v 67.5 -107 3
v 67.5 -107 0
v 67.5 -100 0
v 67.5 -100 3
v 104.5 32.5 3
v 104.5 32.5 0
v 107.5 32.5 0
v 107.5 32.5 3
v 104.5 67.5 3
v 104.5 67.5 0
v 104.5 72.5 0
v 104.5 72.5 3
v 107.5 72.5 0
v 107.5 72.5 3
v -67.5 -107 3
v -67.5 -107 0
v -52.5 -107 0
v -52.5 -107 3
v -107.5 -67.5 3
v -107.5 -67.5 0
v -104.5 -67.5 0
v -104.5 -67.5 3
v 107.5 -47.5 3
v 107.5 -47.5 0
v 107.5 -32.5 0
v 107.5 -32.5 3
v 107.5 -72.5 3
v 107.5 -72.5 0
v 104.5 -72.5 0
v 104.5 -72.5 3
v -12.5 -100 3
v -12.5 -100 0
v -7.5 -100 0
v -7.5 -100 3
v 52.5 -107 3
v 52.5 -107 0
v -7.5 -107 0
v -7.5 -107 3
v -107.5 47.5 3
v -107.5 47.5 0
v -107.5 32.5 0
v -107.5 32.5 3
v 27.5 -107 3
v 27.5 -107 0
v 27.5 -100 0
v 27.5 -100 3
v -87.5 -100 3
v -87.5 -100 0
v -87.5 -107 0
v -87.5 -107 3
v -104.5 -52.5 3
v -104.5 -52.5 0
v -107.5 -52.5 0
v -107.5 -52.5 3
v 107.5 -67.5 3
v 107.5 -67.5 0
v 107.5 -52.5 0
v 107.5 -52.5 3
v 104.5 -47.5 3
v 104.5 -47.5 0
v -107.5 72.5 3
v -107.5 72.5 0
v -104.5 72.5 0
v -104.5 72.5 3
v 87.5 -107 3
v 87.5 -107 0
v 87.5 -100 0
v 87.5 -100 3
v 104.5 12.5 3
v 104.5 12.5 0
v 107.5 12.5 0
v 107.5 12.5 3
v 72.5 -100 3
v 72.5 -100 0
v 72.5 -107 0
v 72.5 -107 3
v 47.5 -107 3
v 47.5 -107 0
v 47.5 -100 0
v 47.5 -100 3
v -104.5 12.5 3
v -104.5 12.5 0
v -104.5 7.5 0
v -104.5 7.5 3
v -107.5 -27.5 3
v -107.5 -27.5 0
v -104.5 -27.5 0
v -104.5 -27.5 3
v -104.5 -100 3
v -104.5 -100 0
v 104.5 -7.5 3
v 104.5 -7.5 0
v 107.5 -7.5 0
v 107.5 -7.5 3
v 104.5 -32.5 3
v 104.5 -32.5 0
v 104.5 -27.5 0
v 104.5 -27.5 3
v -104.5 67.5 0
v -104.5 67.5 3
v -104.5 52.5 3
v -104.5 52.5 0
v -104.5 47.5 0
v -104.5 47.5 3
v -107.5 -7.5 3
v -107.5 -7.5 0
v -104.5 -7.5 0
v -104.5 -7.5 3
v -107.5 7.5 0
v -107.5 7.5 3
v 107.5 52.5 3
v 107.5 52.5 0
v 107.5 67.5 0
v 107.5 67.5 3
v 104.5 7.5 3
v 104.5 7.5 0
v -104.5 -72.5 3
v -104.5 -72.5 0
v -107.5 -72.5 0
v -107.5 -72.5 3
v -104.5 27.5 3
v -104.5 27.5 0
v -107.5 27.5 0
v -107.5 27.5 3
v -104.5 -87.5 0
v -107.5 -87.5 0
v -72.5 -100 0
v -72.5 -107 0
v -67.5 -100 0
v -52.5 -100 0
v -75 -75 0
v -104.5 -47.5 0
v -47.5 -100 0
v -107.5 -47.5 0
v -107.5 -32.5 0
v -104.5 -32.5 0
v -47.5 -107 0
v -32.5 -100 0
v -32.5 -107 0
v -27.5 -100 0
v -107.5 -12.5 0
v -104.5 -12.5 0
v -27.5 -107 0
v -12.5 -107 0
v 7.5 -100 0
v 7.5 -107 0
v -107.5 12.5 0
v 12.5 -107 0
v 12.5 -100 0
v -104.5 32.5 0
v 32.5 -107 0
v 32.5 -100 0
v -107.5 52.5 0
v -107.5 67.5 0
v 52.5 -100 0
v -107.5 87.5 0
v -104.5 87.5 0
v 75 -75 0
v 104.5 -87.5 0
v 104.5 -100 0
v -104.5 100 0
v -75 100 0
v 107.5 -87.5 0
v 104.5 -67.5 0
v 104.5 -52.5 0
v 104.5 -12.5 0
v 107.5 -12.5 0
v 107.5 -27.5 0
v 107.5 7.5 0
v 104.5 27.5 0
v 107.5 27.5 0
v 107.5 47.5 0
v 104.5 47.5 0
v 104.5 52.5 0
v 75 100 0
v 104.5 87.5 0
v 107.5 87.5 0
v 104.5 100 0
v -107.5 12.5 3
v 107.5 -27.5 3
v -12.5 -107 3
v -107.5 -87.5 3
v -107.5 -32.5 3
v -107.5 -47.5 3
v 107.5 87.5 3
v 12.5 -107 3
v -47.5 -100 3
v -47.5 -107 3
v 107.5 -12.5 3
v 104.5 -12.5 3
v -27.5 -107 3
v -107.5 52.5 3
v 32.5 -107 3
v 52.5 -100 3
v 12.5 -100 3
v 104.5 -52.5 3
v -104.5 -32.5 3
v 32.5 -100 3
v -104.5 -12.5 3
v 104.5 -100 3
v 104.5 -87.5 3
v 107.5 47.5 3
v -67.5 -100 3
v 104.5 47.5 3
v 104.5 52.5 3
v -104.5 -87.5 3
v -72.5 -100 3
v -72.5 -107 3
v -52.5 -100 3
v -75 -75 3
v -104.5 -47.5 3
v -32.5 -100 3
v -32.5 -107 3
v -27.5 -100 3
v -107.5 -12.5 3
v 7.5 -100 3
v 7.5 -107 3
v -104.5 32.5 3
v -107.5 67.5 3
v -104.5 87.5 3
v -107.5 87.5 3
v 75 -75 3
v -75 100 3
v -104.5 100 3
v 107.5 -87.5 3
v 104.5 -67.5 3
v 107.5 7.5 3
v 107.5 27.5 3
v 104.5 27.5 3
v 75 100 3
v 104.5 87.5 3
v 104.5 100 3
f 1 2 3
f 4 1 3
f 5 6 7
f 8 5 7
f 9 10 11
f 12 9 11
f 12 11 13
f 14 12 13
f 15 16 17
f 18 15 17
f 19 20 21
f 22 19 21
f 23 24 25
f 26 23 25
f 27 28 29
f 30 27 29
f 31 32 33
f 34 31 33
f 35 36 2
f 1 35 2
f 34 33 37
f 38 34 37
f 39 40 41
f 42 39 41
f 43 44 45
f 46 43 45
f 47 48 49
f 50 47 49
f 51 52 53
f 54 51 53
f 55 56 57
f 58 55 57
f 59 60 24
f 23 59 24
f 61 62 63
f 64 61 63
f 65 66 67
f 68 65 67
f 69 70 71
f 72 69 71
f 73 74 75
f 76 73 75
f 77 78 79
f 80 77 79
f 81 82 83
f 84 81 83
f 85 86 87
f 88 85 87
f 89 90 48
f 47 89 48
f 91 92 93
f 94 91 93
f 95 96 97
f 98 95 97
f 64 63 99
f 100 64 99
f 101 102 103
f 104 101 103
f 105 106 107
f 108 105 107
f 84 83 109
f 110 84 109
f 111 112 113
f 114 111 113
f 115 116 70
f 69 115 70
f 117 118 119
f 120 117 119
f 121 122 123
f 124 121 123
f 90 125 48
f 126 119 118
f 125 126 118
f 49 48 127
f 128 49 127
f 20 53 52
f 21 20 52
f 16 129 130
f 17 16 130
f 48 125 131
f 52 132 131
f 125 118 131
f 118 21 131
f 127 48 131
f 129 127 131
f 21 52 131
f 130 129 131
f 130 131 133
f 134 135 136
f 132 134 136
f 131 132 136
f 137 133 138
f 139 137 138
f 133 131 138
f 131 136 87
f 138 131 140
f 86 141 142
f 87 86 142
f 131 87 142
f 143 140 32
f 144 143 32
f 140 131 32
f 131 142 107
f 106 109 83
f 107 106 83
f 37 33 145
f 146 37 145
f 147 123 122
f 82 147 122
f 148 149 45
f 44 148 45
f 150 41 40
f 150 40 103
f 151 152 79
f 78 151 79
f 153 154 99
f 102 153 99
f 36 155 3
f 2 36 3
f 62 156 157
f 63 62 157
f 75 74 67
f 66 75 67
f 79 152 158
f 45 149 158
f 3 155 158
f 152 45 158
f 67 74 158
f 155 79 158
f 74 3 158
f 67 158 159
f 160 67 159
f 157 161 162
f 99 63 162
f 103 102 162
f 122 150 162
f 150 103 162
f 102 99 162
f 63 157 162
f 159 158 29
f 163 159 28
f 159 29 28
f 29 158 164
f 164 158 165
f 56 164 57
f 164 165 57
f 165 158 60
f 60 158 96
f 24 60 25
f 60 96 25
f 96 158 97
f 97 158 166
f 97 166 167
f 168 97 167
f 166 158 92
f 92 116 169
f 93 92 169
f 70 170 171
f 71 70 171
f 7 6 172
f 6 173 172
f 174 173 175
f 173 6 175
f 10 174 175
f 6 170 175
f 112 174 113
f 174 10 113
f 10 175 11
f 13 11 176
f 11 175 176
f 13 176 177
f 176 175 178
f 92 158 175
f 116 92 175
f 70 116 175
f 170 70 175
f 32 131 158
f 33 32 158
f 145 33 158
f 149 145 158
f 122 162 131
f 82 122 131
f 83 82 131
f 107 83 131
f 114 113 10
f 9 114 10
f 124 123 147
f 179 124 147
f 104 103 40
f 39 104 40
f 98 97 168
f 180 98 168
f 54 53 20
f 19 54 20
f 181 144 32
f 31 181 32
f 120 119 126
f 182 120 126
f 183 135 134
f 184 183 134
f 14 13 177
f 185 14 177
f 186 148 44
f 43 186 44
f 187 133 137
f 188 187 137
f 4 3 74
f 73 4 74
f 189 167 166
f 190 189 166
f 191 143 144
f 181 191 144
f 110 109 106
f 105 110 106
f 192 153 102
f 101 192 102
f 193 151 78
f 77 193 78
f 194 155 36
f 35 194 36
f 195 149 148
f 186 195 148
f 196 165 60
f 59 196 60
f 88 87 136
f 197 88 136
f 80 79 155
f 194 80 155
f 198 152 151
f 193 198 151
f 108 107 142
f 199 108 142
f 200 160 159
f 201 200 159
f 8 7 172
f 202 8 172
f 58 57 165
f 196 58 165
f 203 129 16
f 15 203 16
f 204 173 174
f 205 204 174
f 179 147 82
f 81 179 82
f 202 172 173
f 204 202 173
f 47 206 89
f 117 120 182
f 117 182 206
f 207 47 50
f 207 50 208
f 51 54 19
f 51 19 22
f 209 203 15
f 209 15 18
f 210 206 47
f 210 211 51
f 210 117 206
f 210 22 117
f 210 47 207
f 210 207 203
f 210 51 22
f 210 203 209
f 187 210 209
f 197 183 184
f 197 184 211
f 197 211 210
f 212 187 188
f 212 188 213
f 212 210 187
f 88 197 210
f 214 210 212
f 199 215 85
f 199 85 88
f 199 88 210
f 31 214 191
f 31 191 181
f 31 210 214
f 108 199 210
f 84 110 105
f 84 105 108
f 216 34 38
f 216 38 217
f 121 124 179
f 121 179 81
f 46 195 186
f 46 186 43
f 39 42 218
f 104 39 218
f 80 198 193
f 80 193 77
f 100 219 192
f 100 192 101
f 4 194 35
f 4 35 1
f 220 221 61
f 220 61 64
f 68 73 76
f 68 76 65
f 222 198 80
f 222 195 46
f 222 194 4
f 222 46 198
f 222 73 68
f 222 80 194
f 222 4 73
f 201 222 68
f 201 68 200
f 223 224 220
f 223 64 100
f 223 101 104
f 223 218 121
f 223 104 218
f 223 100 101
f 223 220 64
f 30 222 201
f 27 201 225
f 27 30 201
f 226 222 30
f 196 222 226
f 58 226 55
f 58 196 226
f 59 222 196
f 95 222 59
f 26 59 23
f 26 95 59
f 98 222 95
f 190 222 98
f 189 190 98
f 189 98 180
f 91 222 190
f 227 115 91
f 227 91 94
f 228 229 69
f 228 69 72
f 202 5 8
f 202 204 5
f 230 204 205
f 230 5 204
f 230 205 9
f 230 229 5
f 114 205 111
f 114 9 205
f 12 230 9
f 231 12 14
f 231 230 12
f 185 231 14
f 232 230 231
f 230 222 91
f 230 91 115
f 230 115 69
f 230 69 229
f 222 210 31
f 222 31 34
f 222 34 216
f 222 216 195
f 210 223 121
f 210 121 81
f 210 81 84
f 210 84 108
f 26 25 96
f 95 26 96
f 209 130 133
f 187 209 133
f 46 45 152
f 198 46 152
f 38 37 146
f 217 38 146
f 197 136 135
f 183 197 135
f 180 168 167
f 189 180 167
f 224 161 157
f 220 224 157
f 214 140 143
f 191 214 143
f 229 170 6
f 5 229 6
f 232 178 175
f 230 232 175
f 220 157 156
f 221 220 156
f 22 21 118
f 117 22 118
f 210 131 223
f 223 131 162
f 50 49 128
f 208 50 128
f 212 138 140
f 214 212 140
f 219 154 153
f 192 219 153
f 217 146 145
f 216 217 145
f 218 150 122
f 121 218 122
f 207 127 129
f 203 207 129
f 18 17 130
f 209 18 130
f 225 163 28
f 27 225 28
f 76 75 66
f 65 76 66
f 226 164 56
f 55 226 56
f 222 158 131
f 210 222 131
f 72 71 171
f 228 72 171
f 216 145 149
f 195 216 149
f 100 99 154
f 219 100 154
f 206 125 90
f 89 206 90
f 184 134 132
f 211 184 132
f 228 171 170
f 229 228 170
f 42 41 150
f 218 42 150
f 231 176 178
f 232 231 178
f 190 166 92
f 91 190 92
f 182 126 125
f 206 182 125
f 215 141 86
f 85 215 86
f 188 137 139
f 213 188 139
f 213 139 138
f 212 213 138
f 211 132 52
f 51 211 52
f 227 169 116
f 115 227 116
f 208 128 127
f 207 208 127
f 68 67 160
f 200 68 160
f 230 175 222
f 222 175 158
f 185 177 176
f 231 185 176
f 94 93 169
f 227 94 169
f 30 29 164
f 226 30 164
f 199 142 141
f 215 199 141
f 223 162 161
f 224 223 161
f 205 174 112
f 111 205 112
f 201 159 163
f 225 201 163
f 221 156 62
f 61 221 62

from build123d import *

# Parameters (mm, degrees)
BOSS_EXTRUDE1_DEPTH = 3


with BuildPart() as part:
    # Sketch1 → Boss-Extrude1 (new body)
    with BuildSketch(Plane.XY):
        Polygon((-75, 100), (-104.5, 100), (-104.5, 87.5), (-107.5, 87.5), (-107.5, 72.5), (-104.5, 72.5), (-104.5, 67.5), (-107.5, 67.5), (-107.5, 52.5), (-104.5, 52.5), (-104.5, 47.5), (-107.5, 47.5), (-107.5, 32.5), (-104.5, 32.5), (-104.5, 27.5), (-107.5, 27.5), (-107.5, 12.5), (-104.5, 12.5), (-104.5, 7.5), (-107.5, 7.5), (-107.5, -7.5), (-104.5, -7.5), (-104.5, -12.5), (-107.5, -12.5), (-107.5, -27.5), (-104.5, -27.5), (-104.5, -32.5), (-107.5, -32.5), (-107.5, -47.5), (-104.5, -47.5), (-104.5, -52.5), (-107.5, -52.5), (-107.5, -67.5), (-104.5, -67.5), (-104.5, -72.5), (-107.5, -72.5), (-107.5, -87.5), (-104.5, -87.5), (-104.5, -100), (-87.5, -100), (-87.5, -107), (-72.5, -107), (-72.5, -100), (-67.5, -100), (-67.5, -107), (-52.5, -107), (-52.5, -100), (-47.5, -100), (-47.5, -107), (-32.5, -107), (-32.5, -100), (-27.5, -100), (-27.5, -107), (-12.5, -107), (-12.5, -100), (-7.5, -100), (-7.5, -107), (7.5, -107), (7.5, -100), (12.5, -100), (12.5, -107), (27.5, -107), (27.5, -100), (32.5, -100), (32.5, -107), (47.5, -107), (47.5, -100), (52.5, -100), (52.5, -107), (67.5, -107), (67.5, -100), (72.5, -100), (72.5, -107), (87.5, -107), (87.5, -100), (104.5, -100), (104.5, -87.5), (107.5, -87.5), (107.5, -72.5), (104.5, -72.5), (104.5, -67.5), (107.5, -67.5), (107.5, -52.5), (104.5, -52.5), (104.5, -47.5), (107.5, -47.5), (107.5, -32.5), (104.5, -32.5), (104.5, -27.5), (107.5, -27.5), (107.5, -12.5), (104.5, -12.5), (104.5, -7.5), (107.5, -7.5), (107.5, 7.5), (104.5, 7.5), (104.5, 12.5), (107.5, 12.5), (107.5, 27.5), (104.5, 27.5), (104.5, 32.5), (107.5, 32.5), (107.5, 47.5), (104.5, 47.5), (104.5, 52.5), (107.5, 52.5), (107.5, 67.5), (104.5, 67.5), (104.5, 72.5), (107.5, 72.5), (107.5, 87.5), (104.5, 87.5), (104.5, 100), (75, 100), (75, -75), (-75, -75), align=None)
    extrude(amount=BOSS_EXTRUDE1_DEPTH)


solid = part.part
